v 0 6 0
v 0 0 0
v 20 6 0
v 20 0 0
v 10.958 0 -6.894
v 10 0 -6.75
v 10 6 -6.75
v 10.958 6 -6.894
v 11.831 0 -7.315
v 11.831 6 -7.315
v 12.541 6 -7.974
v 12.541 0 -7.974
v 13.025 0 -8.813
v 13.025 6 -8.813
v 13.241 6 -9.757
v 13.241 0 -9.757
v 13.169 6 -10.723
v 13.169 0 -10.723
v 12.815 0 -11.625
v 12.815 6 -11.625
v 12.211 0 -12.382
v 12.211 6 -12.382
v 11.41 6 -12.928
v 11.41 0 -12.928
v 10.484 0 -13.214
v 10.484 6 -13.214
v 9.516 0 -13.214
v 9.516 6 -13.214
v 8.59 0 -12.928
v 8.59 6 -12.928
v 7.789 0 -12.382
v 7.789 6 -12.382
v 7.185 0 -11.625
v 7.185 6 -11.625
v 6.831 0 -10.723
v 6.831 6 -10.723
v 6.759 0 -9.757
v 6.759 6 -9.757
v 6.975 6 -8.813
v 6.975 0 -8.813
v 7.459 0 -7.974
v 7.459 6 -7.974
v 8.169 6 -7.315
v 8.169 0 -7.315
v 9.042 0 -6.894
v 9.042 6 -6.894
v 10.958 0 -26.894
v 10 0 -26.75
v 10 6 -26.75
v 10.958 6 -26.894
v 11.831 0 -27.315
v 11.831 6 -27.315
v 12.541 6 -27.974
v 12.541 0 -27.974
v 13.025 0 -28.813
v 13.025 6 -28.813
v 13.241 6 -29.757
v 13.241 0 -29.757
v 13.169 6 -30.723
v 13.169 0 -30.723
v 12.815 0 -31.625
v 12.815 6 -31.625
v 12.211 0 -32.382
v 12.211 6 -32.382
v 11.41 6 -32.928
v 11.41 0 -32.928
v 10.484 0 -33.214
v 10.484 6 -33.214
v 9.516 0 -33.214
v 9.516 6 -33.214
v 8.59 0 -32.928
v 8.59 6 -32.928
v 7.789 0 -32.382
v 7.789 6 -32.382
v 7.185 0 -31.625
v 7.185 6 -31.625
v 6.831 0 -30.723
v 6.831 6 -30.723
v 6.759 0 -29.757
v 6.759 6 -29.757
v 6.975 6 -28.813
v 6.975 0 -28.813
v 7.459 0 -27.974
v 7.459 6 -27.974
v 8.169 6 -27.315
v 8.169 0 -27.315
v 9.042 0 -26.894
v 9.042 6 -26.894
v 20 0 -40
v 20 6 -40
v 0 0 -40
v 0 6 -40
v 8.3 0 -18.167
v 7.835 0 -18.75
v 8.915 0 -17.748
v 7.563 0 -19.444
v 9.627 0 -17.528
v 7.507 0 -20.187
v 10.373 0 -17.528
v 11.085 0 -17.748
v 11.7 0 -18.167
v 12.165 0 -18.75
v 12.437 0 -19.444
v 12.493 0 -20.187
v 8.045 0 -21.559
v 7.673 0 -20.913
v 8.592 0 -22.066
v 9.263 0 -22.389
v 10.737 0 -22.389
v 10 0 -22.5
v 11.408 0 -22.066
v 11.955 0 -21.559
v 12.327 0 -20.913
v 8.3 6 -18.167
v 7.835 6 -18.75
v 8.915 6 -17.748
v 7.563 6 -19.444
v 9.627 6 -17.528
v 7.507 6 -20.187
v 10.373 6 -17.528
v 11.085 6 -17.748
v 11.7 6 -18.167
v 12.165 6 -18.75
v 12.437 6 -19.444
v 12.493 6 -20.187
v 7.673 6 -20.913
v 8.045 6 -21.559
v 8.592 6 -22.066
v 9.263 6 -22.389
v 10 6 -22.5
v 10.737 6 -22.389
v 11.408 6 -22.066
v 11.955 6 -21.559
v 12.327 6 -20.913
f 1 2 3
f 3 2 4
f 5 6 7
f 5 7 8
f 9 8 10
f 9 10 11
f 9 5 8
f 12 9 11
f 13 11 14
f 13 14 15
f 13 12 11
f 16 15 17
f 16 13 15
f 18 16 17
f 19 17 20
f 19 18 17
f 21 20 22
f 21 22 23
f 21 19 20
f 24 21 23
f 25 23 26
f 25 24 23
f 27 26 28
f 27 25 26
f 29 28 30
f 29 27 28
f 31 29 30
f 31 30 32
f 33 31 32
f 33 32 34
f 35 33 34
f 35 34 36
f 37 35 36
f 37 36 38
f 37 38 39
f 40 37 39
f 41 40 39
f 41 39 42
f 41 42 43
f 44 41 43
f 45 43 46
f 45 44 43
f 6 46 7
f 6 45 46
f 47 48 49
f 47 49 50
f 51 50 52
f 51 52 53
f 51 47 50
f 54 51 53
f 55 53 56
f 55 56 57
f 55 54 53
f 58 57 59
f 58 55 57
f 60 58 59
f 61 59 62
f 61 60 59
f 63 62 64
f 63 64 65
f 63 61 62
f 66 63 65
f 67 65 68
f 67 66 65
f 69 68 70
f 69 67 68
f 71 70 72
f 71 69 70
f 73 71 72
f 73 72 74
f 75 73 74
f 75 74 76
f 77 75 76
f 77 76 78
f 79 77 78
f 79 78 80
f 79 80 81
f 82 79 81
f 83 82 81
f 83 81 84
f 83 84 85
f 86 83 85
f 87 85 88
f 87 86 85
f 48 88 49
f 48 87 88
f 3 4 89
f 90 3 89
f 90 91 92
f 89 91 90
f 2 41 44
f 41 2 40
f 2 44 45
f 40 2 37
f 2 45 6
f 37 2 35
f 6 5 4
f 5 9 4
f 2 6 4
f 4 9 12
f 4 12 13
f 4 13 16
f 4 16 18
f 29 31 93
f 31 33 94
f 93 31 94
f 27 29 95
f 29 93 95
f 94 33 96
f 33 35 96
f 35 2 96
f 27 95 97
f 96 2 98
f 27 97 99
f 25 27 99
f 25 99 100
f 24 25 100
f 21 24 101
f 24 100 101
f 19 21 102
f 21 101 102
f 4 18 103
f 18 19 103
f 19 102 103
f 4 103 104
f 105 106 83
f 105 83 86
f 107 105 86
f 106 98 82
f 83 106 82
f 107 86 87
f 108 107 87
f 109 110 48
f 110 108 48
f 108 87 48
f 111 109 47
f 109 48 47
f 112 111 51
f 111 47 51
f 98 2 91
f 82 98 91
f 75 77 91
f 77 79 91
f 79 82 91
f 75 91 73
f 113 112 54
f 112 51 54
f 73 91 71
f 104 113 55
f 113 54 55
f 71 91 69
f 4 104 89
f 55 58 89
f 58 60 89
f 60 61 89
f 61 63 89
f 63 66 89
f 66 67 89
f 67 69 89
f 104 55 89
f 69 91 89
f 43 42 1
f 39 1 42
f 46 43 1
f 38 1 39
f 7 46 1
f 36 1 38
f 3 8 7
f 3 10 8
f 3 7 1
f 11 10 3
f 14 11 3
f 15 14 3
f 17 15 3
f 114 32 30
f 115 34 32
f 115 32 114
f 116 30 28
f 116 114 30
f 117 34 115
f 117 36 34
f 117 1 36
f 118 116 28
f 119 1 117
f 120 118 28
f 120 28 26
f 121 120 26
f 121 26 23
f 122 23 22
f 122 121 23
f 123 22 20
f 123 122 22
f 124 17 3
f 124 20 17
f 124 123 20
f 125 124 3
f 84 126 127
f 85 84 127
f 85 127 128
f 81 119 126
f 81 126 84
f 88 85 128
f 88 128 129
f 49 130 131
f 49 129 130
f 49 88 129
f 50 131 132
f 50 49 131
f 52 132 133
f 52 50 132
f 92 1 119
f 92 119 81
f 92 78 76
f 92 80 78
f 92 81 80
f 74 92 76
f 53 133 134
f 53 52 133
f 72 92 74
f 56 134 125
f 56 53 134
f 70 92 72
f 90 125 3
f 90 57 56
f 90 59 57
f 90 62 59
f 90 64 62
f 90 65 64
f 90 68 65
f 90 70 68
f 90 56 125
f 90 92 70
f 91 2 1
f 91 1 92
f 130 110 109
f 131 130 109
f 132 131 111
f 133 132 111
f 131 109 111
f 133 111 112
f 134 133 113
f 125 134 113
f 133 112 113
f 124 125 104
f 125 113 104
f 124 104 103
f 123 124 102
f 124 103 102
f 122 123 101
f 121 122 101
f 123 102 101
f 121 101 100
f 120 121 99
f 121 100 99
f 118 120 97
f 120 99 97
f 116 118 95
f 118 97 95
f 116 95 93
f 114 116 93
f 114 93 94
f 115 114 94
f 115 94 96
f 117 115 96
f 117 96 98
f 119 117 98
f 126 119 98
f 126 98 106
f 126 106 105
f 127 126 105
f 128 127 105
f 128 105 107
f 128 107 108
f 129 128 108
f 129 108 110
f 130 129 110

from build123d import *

# Parameters (mm, degrees)
SKETCH_1_W         = 20
SKETCH_1_H         = 40
SKETCH_1_R         = 3.25
EXTRUDE_1_DEPTH    = 6
HOLE_WIZARD_M6_1_D = 5


with BuildPart() as part:
    # 草图1 → 凸台-拉伸1 (new body)
    with BuildSketch(Plane(origin=(0, 0, 0), x_dir=(1, 0, 0), z_dir=(0, 1, 0))):
        with Locations((10, 20)):
            Rectangle(SKETCH_1_W, SKETCH_1_H)
        with Locations(Location((10, 30, 0), (0, 0, 270))):
            Circle(SKETCH_1_R, mode=Mode.SUBTRACT)
        with Locations(Location((10, 10, 0), (0, 0, 270))):
            Circle(SKETCH_1_R, mode=Mode.SUBTRACT)
    extrude(amount=EXTRUDE_1_DEPTH)

    # M6 螺纹孔1 (through all)
    with Locations(Plane(origin=(10, 6, -20), x_dir=(0, 0, 1), z_dir=(0, 1, 0))):
        with Locations((0, 0)):
            Hole(HOLE_WIZARD_M6_1_D / 2)


solid = part.part
